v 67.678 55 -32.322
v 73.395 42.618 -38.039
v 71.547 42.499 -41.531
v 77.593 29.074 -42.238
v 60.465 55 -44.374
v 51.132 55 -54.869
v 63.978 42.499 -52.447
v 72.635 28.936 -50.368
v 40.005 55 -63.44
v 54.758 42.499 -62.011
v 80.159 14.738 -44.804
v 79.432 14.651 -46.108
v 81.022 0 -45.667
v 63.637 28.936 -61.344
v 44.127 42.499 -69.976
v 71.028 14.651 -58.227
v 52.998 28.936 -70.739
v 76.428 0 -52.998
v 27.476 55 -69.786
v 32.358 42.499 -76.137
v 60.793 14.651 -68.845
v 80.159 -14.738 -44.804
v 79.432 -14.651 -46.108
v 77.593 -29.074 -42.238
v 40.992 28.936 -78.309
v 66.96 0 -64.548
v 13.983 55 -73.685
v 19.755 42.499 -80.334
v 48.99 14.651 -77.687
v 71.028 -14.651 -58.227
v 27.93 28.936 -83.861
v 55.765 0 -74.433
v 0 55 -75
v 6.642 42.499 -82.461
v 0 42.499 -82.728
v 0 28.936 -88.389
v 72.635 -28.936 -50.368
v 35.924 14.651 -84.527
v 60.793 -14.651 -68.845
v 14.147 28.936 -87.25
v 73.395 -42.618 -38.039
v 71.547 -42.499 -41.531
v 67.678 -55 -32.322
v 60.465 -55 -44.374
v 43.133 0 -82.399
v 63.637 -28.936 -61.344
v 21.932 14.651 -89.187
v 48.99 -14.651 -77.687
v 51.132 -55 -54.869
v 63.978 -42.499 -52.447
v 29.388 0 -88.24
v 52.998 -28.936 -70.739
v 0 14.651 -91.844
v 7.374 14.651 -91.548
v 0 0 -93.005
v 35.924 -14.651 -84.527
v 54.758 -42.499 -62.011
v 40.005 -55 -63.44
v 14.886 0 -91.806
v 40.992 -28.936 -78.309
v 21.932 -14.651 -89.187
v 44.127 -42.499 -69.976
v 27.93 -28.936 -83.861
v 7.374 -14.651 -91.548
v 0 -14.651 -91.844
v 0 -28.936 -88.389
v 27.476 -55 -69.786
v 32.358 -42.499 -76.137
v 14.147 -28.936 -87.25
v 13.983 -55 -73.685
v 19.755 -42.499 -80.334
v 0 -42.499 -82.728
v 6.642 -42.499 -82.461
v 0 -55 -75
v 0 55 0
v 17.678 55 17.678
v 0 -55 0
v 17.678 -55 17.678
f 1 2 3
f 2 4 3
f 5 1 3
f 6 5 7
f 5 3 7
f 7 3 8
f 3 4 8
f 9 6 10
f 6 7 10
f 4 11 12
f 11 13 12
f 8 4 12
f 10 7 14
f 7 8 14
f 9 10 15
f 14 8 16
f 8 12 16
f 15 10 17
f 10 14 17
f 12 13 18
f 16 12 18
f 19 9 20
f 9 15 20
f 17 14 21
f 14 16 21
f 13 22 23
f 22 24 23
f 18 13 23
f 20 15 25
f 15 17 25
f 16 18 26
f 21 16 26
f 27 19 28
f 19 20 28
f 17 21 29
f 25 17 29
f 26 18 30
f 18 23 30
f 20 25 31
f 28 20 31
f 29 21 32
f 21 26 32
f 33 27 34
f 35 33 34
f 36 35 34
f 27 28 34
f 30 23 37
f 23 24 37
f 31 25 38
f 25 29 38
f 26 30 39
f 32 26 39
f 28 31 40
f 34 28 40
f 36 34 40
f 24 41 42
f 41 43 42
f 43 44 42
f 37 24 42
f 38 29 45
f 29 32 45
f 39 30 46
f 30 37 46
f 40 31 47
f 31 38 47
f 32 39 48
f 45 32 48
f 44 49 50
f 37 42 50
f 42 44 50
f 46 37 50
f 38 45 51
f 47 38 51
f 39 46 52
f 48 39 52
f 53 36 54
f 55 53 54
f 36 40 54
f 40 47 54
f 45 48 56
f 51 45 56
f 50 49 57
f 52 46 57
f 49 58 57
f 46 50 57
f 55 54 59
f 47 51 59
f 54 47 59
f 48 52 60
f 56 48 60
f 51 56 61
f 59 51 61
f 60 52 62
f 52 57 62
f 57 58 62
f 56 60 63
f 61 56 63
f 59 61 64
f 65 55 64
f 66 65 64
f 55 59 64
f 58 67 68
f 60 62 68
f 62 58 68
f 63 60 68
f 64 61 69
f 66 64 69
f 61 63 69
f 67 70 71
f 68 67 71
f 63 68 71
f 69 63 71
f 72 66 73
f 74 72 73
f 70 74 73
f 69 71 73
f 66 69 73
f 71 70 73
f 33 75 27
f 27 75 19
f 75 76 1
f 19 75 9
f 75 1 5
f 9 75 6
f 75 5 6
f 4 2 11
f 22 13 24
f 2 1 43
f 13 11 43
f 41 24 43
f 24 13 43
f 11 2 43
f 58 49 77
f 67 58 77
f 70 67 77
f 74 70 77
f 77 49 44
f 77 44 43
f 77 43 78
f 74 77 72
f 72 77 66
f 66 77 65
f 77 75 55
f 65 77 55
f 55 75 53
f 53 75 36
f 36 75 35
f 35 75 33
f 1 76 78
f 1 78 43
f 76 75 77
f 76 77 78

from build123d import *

# Parameters (mm, degrees)
OBR_T1_ANGLE               = 180
WYTNIJ_WYCI_GNI_CIE6_DEPTH = 172.464281995
WYTNIJ_WYCI_GNI_CIE7_DEPTH = 166.271168412


with BuildPart() as part:
    # Szkic1 → Obrót1 (revolve)
    with BuildSketch(Plane(origin=(0, 0, 0), x_dir=(0, 0, -1), z_dir=(1, 0, 0))):
        with BuildLine():
            Line((0, -55), (0, 55))
            Line((0, 55), (-75, 55))
            ThreePointArc((-75, 55), (-93.005376189, 0), (-75, -55))
            Line((-75, -55), (0, -55))
        make_face()
    revolve(axis=Axis((0, -55, 0), (0, 1, 0)), revolution_arc=OBR_T1_ANGLE)

    # Szkic2 → Wytnij-wyciągnięcie6 (cut, through all)
    with BuildSketch(Plane.XZ.offset(55)):
        with BuildLine():
            Line((-50.140376582, 0), (-26.065901524, 0))
            Line((-26.065901524, 0), (-26.065901524, 75))
            Line((-26.065901524, 75), (0, 75))
            ThreePointArc((0, 75), (6.164498497, 74.746230395), (12.287280664, 73.986638888))
            ThreePointArc((12.287280664, 73.986638888), (66.513138224, 34.655482158), (67.67766953, -32.32233047))
            Line((67.67766953, -32.32233047), (87.353699516, -51.998360457))
            Line((87.353699516, -51.998360457), (99.71705874, -51.998360457))
            Line((99.71705874, -51.998360457), (99.71705874, 112.393065192))
            Line((99.71705874, 112.393065192), (-50.140376582, 112.393065192))
            Line((-50.140376582, 112.393065192), (-50.140376582, 0))
        make_face()
    extrude(amount=-WYTNIJ_WYCI_GNI_CIE6_DEPTH, mode=Mode.SUBTRACT)

    # Szkic6 → Wytnij-wyciągnięcie7 (cut, through all)
    with BuildSketch(Plane.XZ.offset(55)):
        with BuildLine():
            ThreePointArc((67.67766953, -32.32233047), (63.439635817, 40.00515726), (0, 75))
            Line((0, 75), (0, 0))
            Line((0, 0), (17.67766953, 17.67766953))
            Line((17.67766953, 17.67766953), (67.67766953, -32.32233047))
        make_face()
    extrude(amount=-WYTNIJ_WYCI_GNI_CIE7_DEPTH, mode=Mode.SUBTRACT)


solid = part.part
